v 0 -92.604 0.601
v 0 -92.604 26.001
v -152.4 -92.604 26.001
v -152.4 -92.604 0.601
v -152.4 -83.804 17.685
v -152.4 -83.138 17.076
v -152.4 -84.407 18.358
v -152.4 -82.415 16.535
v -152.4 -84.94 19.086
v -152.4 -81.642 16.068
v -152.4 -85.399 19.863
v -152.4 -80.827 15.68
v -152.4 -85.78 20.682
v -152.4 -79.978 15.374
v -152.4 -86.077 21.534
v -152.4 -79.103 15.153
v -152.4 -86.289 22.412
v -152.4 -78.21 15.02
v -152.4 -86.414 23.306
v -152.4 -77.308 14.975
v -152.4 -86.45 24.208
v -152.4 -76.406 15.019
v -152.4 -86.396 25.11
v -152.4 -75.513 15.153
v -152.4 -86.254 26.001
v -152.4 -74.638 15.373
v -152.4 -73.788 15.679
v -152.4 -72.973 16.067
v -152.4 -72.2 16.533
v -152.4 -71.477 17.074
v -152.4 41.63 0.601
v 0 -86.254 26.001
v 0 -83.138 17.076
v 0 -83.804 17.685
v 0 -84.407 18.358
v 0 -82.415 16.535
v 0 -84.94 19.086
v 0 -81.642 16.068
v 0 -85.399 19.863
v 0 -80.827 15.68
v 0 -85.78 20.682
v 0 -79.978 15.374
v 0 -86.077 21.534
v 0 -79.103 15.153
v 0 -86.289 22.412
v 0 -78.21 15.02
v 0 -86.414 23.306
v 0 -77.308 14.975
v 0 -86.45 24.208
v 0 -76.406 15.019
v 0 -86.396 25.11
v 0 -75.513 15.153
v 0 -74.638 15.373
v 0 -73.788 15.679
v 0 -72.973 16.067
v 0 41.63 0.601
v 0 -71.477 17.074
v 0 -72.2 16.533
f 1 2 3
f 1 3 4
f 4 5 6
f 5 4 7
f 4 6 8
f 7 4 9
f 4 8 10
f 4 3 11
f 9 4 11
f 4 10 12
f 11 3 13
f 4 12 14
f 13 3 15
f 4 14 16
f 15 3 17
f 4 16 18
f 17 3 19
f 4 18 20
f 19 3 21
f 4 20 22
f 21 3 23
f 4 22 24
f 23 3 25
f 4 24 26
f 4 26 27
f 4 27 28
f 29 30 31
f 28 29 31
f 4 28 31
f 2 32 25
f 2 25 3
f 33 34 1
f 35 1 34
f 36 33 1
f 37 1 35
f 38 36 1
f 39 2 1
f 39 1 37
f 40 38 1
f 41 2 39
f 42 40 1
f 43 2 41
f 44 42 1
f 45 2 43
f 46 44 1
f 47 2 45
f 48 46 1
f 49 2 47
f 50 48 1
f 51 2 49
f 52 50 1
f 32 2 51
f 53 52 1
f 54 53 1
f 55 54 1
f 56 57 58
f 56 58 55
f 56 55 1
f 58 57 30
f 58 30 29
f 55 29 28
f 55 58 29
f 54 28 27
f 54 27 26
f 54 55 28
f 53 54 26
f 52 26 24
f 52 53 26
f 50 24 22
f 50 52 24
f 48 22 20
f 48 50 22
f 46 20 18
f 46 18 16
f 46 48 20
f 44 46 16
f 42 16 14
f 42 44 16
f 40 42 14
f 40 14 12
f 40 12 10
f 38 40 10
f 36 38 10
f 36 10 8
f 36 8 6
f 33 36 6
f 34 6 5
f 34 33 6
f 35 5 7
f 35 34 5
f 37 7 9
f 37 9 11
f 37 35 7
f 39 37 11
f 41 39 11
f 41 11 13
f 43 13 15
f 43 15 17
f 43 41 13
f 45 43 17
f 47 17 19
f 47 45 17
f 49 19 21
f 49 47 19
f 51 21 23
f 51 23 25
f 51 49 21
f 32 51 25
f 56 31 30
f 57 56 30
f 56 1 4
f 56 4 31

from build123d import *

# Parameters (mm, degrees)
F1_DEPTH = 152.4


with BuildPart() as f1:
    # F0 (on Right) → F1 (new body)
    with BuildSketch(Plane.YZ):
        with BuildLine():
            Line((-92.604421, 0.601124), (-90.45029, 0.601124))
            Line((-90.45029, 0.601124), (41.62971, 0.601124))
            Line((41.62971, 0.601124), (-71.477041, 17.073922))
            ThreePointArc((-71.477041, 17.073922), (-82.034408, 16.292348), (-86.254421, 26.001124))
            Line((-86.254421, 26.001124), (-92.604421, 26.001124))
            Line((-92.604421, 26.001124), (-92.604421, 0.601124))
        make_face()
    extrude(amount=-F1_DEPTH)


solid = f1.part
